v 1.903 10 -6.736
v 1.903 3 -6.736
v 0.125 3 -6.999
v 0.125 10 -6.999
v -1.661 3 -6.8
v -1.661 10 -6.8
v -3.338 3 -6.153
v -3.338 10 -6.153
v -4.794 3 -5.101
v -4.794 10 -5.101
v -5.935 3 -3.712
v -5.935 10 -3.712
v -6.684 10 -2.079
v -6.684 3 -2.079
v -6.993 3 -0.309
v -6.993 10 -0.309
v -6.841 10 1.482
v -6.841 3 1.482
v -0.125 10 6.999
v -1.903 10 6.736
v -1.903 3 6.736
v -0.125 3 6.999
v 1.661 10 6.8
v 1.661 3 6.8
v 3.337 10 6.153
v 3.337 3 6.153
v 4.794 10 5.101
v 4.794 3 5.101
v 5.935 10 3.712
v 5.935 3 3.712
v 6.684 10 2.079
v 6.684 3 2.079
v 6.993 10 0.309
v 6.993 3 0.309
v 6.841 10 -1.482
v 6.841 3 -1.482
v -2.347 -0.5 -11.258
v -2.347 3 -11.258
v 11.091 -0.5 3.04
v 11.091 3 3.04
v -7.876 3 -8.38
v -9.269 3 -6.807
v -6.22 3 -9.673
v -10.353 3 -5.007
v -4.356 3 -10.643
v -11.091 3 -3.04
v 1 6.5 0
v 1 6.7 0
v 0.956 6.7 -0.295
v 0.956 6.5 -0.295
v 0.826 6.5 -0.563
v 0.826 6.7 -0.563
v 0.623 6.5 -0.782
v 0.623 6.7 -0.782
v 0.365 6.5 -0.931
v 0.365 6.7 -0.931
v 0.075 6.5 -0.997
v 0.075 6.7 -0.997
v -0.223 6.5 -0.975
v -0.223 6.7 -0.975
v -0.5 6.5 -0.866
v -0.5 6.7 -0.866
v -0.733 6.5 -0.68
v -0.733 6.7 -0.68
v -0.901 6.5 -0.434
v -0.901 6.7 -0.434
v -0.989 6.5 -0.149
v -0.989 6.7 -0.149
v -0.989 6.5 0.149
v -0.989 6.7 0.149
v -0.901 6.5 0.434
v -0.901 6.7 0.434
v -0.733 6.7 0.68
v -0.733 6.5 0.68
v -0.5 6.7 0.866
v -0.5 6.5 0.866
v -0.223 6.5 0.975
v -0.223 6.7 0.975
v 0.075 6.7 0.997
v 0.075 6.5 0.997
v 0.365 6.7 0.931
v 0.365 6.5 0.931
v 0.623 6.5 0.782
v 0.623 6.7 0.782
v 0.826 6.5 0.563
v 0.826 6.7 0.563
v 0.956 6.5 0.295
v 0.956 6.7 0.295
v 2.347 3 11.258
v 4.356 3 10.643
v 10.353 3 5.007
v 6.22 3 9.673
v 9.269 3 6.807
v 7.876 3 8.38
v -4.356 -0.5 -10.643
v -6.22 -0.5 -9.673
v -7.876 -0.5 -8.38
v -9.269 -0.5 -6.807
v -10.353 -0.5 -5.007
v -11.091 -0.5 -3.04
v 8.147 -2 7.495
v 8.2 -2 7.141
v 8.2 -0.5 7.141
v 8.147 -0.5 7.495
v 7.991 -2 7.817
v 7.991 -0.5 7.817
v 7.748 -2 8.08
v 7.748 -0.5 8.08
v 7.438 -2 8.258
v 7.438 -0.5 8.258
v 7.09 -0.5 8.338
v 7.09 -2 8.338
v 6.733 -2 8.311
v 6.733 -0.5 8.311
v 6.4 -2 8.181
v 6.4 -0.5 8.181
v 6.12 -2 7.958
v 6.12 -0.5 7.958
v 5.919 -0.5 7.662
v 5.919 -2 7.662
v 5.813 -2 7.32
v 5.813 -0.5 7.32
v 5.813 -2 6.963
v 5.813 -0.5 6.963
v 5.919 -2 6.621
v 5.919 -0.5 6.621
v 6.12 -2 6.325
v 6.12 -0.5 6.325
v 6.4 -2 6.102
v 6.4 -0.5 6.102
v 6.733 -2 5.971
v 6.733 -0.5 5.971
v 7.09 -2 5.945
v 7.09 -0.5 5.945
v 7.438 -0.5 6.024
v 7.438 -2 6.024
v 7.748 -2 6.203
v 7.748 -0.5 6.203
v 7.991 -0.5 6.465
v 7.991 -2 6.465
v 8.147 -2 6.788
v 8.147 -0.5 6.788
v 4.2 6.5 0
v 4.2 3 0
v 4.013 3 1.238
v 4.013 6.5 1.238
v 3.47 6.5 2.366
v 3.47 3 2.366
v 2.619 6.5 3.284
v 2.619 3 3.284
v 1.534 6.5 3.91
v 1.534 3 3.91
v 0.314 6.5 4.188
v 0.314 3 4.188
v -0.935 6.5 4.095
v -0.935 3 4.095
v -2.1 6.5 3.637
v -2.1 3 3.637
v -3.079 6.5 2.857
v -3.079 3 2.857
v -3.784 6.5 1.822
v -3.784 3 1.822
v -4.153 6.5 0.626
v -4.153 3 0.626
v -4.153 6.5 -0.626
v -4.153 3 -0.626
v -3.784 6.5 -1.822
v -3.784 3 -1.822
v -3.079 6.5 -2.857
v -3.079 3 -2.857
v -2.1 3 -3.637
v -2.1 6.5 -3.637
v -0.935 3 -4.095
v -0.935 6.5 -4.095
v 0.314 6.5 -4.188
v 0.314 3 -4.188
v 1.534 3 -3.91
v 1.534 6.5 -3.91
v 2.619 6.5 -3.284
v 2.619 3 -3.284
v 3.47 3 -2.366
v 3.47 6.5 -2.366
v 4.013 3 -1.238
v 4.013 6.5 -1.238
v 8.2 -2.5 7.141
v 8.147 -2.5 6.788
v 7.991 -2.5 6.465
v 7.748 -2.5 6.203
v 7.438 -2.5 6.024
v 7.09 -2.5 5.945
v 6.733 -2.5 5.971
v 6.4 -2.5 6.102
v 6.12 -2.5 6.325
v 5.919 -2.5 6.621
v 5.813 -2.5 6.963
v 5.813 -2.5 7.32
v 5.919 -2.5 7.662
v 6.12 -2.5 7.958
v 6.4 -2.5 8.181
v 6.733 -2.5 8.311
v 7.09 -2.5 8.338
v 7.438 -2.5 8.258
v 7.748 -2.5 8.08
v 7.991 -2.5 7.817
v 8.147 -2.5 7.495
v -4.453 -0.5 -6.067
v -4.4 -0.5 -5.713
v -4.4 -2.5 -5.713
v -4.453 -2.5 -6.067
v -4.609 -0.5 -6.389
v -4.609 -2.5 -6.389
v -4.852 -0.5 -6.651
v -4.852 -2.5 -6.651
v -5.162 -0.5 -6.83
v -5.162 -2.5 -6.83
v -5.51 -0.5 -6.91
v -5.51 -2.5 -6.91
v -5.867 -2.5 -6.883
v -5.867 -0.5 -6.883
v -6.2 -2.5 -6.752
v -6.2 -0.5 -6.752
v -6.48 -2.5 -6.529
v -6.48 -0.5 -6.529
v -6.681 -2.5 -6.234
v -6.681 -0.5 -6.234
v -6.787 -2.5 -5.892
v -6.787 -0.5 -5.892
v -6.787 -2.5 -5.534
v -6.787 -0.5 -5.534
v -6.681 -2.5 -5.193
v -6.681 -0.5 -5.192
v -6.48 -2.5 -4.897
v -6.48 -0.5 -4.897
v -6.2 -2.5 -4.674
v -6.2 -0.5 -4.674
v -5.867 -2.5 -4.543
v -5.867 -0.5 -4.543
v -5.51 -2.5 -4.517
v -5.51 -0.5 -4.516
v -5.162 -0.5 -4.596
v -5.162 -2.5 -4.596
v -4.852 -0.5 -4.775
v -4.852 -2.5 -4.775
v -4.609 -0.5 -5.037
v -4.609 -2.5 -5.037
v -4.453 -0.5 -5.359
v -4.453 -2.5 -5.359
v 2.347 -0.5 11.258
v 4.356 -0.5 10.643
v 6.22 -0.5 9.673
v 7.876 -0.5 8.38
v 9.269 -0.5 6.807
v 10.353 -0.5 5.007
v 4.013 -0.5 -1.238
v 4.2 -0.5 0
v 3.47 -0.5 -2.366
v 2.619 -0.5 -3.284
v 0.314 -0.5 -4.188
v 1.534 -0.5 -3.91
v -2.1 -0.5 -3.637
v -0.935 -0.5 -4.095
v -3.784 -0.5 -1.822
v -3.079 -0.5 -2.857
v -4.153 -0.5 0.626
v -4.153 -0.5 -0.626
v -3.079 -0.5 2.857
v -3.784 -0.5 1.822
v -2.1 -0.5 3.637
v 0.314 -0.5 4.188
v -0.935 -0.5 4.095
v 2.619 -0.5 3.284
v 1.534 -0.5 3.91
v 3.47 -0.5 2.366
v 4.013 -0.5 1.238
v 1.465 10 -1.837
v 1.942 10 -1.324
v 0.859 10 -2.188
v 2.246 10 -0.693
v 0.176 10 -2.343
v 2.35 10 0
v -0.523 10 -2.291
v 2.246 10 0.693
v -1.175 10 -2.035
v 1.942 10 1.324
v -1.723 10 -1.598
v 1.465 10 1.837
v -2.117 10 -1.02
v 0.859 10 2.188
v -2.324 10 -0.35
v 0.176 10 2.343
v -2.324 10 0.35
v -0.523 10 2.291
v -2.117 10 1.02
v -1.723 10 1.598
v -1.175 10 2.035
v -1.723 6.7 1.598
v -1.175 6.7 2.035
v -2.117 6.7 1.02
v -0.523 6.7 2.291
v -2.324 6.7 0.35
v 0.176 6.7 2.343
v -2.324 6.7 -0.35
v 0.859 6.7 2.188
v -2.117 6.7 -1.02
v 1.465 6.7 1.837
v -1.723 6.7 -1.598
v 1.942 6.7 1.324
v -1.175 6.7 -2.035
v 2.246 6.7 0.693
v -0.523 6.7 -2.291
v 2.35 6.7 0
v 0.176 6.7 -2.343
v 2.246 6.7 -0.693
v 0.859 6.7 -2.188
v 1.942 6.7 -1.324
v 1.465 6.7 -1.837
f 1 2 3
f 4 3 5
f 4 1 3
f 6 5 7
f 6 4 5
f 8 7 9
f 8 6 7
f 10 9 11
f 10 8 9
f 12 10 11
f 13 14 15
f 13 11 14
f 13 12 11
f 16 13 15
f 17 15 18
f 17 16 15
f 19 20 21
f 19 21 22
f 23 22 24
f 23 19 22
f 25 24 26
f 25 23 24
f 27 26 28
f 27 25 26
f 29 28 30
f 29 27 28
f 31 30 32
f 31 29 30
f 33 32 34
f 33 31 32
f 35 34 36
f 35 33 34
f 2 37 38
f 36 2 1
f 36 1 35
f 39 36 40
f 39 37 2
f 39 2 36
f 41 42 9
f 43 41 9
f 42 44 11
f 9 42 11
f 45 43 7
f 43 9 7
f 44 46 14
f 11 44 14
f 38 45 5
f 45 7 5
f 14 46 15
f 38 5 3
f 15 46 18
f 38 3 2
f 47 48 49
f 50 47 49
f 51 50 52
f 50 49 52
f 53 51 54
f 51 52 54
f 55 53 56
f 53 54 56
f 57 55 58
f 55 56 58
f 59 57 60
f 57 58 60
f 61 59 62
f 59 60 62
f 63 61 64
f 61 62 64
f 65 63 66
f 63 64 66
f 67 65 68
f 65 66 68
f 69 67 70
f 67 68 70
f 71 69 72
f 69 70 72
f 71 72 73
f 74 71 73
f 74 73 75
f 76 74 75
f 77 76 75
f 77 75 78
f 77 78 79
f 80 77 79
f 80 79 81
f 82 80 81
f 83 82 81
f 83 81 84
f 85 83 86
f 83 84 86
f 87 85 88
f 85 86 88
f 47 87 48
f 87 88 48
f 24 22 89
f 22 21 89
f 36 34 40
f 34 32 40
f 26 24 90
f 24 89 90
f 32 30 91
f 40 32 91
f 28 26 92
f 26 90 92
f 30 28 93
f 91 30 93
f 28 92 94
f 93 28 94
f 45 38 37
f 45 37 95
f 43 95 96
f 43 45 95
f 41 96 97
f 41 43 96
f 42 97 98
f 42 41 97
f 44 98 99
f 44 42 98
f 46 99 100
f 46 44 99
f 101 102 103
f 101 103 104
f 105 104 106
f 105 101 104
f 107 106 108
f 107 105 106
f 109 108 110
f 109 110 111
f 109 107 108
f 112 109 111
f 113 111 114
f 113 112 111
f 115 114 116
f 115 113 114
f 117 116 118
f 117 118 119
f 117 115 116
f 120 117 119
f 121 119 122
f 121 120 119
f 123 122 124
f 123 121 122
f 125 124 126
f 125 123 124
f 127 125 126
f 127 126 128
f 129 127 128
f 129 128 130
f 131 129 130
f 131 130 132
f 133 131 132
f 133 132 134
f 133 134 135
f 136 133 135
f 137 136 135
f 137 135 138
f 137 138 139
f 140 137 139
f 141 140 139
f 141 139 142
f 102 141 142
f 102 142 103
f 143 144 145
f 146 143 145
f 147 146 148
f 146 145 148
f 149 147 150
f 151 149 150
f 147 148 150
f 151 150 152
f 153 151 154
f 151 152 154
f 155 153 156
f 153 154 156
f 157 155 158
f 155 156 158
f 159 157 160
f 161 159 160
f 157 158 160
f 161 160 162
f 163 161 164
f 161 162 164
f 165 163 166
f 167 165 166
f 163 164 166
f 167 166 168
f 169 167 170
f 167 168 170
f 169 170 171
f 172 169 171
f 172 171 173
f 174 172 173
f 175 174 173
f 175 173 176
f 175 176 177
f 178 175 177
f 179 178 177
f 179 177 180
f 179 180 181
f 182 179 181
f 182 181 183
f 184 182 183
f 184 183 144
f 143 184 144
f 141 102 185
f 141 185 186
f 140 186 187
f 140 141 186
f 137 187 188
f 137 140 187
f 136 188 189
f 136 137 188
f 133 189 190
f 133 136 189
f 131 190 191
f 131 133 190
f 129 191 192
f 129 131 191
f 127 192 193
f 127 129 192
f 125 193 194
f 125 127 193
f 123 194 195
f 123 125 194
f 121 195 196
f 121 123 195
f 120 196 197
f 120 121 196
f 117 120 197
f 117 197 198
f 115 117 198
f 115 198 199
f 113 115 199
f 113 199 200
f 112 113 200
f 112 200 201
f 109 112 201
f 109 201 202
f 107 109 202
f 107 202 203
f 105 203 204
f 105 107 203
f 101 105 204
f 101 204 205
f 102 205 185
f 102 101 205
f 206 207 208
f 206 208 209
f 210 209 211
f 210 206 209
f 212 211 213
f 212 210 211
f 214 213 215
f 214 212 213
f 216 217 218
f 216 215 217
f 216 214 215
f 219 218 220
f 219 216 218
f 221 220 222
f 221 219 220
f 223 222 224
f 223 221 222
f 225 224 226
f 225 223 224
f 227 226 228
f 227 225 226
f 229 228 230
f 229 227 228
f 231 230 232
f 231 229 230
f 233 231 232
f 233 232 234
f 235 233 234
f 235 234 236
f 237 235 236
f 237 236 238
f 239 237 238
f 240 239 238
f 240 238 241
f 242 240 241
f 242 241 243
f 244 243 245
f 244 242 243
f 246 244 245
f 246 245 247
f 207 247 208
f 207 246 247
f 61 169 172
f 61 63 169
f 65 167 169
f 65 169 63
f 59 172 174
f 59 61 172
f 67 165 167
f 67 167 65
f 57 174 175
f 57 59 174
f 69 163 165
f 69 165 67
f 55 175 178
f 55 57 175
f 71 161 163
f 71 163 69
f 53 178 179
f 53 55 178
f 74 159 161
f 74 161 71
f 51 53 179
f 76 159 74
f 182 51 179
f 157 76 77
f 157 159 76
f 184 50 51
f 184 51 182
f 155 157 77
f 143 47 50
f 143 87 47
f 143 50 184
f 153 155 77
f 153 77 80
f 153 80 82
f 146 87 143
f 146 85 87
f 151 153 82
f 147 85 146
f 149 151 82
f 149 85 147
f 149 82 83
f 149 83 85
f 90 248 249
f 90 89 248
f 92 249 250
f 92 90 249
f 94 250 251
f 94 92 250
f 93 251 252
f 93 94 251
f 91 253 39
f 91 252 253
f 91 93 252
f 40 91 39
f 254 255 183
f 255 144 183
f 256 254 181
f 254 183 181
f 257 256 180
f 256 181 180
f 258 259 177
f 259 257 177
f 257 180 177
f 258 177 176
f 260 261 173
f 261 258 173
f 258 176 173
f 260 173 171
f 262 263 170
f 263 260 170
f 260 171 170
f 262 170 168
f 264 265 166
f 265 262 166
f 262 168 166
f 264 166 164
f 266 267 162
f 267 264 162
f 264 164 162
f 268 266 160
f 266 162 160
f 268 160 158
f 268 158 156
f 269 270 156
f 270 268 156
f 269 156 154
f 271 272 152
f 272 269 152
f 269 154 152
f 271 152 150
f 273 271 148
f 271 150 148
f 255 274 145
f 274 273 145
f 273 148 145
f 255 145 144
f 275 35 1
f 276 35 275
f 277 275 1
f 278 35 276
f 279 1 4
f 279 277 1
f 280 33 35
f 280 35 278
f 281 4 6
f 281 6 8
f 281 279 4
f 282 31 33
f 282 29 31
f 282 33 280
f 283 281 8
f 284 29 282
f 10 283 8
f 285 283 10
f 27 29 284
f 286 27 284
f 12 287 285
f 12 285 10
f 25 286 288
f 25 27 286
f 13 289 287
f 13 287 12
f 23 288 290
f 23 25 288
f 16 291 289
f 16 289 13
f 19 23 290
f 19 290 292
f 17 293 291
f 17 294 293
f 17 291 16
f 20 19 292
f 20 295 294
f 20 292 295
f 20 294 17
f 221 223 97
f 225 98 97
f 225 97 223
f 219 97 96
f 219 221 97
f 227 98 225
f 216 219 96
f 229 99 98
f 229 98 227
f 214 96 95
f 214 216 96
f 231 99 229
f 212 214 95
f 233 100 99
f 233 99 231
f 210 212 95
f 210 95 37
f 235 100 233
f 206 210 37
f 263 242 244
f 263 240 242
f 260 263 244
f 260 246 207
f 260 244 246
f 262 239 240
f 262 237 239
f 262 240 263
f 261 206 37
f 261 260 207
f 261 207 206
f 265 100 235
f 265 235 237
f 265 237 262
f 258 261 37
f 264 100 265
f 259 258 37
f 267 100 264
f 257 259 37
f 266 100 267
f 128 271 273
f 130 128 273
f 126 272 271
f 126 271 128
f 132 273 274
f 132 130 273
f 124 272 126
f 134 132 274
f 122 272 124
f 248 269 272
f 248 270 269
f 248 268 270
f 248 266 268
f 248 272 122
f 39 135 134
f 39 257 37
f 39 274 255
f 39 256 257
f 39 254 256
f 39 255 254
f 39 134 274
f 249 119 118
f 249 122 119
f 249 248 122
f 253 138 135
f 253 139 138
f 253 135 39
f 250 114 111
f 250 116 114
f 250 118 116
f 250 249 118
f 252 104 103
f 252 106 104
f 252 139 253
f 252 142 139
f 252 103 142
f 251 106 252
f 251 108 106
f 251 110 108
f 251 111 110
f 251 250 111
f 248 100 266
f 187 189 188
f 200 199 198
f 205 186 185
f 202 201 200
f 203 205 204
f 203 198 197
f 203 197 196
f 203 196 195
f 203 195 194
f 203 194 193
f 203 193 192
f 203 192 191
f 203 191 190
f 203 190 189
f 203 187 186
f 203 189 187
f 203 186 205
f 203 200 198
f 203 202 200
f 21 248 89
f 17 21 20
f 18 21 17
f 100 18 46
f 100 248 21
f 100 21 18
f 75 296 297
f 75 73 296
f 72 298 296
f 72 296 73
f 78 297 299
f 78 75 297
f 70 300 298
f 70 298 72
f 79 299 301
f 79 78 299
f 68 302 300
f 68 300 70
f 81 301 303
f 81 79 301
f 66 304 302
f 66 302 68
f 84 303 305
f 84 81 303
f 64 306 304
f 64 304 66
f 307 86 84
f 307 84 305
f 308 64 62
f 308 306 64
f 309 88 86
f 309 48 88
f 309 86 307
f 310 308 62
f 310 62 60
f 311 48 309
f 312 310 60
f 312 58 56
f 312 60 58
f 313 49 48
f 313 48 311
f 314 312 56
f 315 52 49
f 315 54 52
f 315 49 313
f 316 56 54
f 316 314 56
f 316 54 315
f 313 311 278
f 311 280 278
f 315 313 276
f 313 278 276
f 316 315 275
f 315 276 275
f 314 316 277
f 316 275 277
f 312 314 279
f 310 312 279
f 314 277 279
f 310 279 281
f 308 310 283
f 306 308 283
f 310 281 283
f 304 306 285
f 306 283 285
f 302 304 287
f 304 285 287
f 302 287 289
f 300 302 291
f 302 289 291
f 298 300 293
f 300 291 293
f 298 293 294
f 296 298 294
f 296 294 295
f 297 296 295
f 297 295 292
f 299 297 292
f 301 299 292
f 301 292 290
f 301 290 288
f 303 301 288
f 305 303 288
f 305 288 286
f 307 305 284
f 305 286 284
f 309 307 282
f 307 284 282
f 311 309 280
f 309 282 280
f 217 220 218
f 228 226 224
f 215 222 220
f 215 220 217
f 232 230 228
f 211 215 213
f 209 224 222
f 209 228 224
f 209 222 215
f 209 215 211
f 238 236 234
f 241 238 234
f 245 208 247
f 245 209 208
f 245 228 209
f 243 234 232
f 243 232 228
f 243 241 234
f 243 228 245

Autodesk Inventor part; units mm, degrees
ref_plane "YZ Plane" through (0, 0, 0) normal (1, 0, 0) x (0, 1, 0)
ref_plane "XZ Plane" through (0, 0, 0) normal (0, 1, 0) x (-1, 0, 0)
ref_plane "XY Plane" through (0, 0, 0) normal (0, 0, 1) x (1, 0, 0)
sketch "Skizze1" plane through (0, 0, 0) normal (0, 1, 0) x (-1, 0, 0)
  circle A0 centre (0, 0) radius 15
  dimension "d0" = 30
extrude "Extrusion1" add sketch "Skizze1" along normal blind 10
sketch "Skizze2" plane through (0, 0, 0) normal (0, -1, 0) x (1, 0, 0)
  line L0 (14.3188, 0.9) -> (12.9688, 0.9)
  line L1 (12.9688, -0.9) -> (14.3188, -0.9)
  line L2 (14.3188, -0.9) -> (14.3188, 0.9)
  line L3 (-21.3175, 0) -> (21.3175, 0) projected
  arc A0 (12.9688, 0.9) -> (0.9, 12.9688) centre (0, 0) ccw
  line L4 (-0.9, -12.9688) -> (-0.9, -14.3188)
  line L5 (-0.9, -14.3188) -> (0.9, -14.3188)
  line L6 (0.9, -14.3188) -> (0.9, -12.9688)
  line L7 (-12.9688, 0.9) -> (-14.3188, 0.9)
  line L8 (-14.3188, 0.9) -> (-14.3188, -0.9)
  line L9 (-14.3188, -0.9) -> (-12.9688, -0.9)
  line L10 (-0.9, 12.9688) -> (-0.9, 14.3188)
  line L11 (-0.9, 14.3188) -> (0.9, 14.3188)
  line L12 (0.9, 14.3188) -> (0.9, 12.9688)
  line L13 (0, -21.3175) -> (0, 21.3175) projected
  line L14 (-21.3175, 0) -> (21.3175, 0) projected
  arc A1 (0.9, -12.9688) -> (12.9688, -0.9) centre (0, 0) ccw
  arc A2 (-12.9688, -0.9) -> (-0.9, -12.9688) centre (0, 0) ccw
  arc A3 (-0.9, 12.9688) -> (-12.9688, 0.9) centre (0, 0) ccw
  circle A4 centre (0, 0) radius 4.2
  circle A5 centre (7, 7.1414) radius 1.2
  circle A6 centre (-5.6, -5.7131) radius 1.2
  dimension "d4" = 0.9
  dimension "d5" = 0.9
  dimension "d8" = 1.35
  dimension "d9" = 1.35
  dimension "d10" = 1.8
  dimension "d11" = 0.9
  dimension "d12" = 1.35
  dimension "d13" = 1.8
  dimension "d14" = 0.9
  dimension "d15" = 0.9
  dimension "d16" = 1.35
  dimension "d17" = 8.4
  dimension "d18" = 2.4
  dimension "d19" = 2.4
  dimension "d20" = 8
  dimension "d21" = 10
  dimension "d22" = 7
  dimension "d23" = 5.6
  dimension "d50" = 13
  dimension "d51" = 13
  dimension "d52" = 1.35
  dimension "d53" = 1.35
  dimension "d54" = 1.35
extrude "Extrusion2" cut sketch "Skizze2" against normal blind 3 contours L2 L3 A4 L13 L11 L12 A0 L0 | L2 L1 A1 L6 L5 L13 A4 L3 | A4 L3 L8 L7 A3 L10 L11 L13 | L13 L5 L4 A2 L9 L8 L3 A4
sketch "Skizze4" plane through (7, 0, 7.1414) normal (0, -1, 0) x (1, 0, 0)
  circle A0 centre (-7, -7.1414) radius 4.2
  circle A1 centre (-12.6, -12.8546) radius 1.2
  circle A2 centre (0, 0) radius 1.2
  line L0 (-7, -28.1414) -> (-7, 13.8586) projected
  dimension "d26" = 2.4
  dimension "d27" = 5.6
  dimension "d28" = 8
  dimension "d44" = 8.4
  dimension "d45" = 2.4
extrude "Extrusion3" add sketch "Skizze4" along normal blind 2
sketch "Skizze5" plane through (0, 10, 0) normal (0, 1, 0) x (1, 0, 0)
  circle A0 centre (0, 0) radius 19.262
  circle A1 centre (0, 0) radius 7
  dimension "d31" = 14
extrude "Extrusion4" cut sketch "Skizze5" against normal blind 7
fillet "Rundung1" radius 1 8 edges at (12.9688, 1.5, -0.9) (12.9688, 1.5, 0.9) (0.9, 1.5, -12.9688) (-0.9, 1.5, -12.9688) (-12.9688, 1.5, -0.9) (-12.9688, 1.5, 0.9) (-0.9, 1.5, 12.9688) (0.9, 1.5, 12.9688)
sketch "Skizze8" plane through (0, 10, 0) normal (0, 1, 0) x (1, 0, 0)
  circle A0 centre (0, 0) radius 1
  dimension "d46" = 2
extrude "Extrusion7" cut sketch "Skizze8" against normal blind 7
sketch "Skizze9" plane through (0, -2, 0) normal (0, -1, 0) x (1, 0, 0)
  line L0 (18.2687, 9.2162) -> (-7.478, -18.1772)
  line L1 (-7.478, -18.1772) -> (18.2687, -18.1772)
  line L2 (18.2687, -18.1772) -> (18.2687, 9.2162)
  line L3 (8.0673, 18.8043) -> (-17.6793, -8.5891)
  line L4 (-17.6793, -8.5891) -> (-17.6793, 18.8043)
  line L5 (-17.6793, 18.8043) -> (8.0673, 18.8043)
  point P0 (0, 0)
  dimension "d55" = 7
  dimension "d56" = 7
extrude "Extrusion8" cut sketch "Skizze9" against normal blind 50
sketch "Skizze10" plane through (0, -2, 0) normal (0, -1, 0) x (1, 0, 0)
  circle A0 centre (0, 0) radius 11.5
  circle A1 centre (0, 0) radius 18.9246
  dimension "d61" = 23
extrude "Extrusion9" cut sketch "Skizze10" against normal blind 10
sketch "Skizze11" plane through (0, -2, 0) normal (0, -1, 0) x (1, 0, 0)
  circle A0 centre (0, 0) radius 1 projected
  circle A1 centre (0, 0) radius 4.2
extrude "Extrusion10" cut sketch "Skizze11" against normal blind 8.5 contours A0 | A1
sketch "Skizze13" plane through (0, 3, 0) normal (0, -1, 0) x (1, 0, 0)
  circle A0 centre (7, 7.1414) radius 1.2 projected
  circle A1 centre (7, 7.1414) radius 1.2
  circle A2 centre (-5.6, -5.7131) radius 1.2 projected
  circle A3 centre (-5.6, -5.7131) radius 1.2
  arc A4 (11.3495, 1.8544) -> (1.1481, 11.4425) centre (0, 0) ccw
  line L0 (11.3495, 1.8544) -> (8.9749, -0.6721) projected
  line L1 (11.3495, 1.8544) -> (-1.1481, -11.4425)
  line L2 (1.1481, 11.4425) -> (-11.3495, -1.8544)
  line L3 (1.2265, -8.916) -> (-1.1481, -11.4425) projected
  arc A5 (-11.3495, -1.8544) -> (-1.1481, -11.4425) centre (0, 0) ccw
  circle A6 centre (0, 0) radius 4.2
extrude "Extrusion11" add sketch "Skizze13" along normal blind 3.5
sketch "Skizze14" plane through (7, -2, 7.1414) normal (0, -1, 0) x (1, 0, 0)
  circle A0 centre (0, 0) radius 1.2 projected
  circle A1 centre (0, 0) radius 1.2
  circle A2 centre (-12.6, -12.8546) radius 1.2 projected
  circle A3 centre (-12.6, -12.8546) radius 1.2
  point P0 (-7, -7.1414)
extrude "Extrusion12" add sketch "Skizze14" along normal blind 0.5
sketch "Skizze15" plane through (0, 10, 0) normal (0, 1, 0) x (1, 0, 0)
  circle A0 centre (0, 0) radius 1 projected
  circle A1 centre (0, 0) radius 2.35
  dimension "d68" = 4.7
extrude "Extrusion13" cut sketch "Skizze15" against normal blind 3.3 contours A0 | A1
sketch "Skizze17" plane through (0, -0.5, 0) normal (0, -1, 0) x (1, 0, 0)
  line L0 (2.8954, 11.8415) -> (-13.3125, -5.4031)
  line L1 (1.1481, 11.4425) -> (-5.1007, 4.7941) projected
  line L2 (-13.3125, -5.4031) -> (-13.3125, 19.7684)
  line L3 (-13.3125, 19.7684) -> (2.8954, 11.8415)
  line L4 (-3.5303, -12.5169) -> (12.8557, 4.9171)
  line L5 (-1.1481, -11.4425) -> (5.1007, -4.7941) projected
  line L6 (12.8557, 4.9171) -> (12.8557, -12.5169)
  line L7 (12.8557, -12.5169) -> (-3.5303, -12.5169)
  point P0 (0, 0)
  dimension "d71" = 1
  dimension "d72" = 1
extrude "Extrusion14" cut sketch "Skizze17" against normal blind 15
properties part number "Adaptation_on_OPdevside_4_3"
